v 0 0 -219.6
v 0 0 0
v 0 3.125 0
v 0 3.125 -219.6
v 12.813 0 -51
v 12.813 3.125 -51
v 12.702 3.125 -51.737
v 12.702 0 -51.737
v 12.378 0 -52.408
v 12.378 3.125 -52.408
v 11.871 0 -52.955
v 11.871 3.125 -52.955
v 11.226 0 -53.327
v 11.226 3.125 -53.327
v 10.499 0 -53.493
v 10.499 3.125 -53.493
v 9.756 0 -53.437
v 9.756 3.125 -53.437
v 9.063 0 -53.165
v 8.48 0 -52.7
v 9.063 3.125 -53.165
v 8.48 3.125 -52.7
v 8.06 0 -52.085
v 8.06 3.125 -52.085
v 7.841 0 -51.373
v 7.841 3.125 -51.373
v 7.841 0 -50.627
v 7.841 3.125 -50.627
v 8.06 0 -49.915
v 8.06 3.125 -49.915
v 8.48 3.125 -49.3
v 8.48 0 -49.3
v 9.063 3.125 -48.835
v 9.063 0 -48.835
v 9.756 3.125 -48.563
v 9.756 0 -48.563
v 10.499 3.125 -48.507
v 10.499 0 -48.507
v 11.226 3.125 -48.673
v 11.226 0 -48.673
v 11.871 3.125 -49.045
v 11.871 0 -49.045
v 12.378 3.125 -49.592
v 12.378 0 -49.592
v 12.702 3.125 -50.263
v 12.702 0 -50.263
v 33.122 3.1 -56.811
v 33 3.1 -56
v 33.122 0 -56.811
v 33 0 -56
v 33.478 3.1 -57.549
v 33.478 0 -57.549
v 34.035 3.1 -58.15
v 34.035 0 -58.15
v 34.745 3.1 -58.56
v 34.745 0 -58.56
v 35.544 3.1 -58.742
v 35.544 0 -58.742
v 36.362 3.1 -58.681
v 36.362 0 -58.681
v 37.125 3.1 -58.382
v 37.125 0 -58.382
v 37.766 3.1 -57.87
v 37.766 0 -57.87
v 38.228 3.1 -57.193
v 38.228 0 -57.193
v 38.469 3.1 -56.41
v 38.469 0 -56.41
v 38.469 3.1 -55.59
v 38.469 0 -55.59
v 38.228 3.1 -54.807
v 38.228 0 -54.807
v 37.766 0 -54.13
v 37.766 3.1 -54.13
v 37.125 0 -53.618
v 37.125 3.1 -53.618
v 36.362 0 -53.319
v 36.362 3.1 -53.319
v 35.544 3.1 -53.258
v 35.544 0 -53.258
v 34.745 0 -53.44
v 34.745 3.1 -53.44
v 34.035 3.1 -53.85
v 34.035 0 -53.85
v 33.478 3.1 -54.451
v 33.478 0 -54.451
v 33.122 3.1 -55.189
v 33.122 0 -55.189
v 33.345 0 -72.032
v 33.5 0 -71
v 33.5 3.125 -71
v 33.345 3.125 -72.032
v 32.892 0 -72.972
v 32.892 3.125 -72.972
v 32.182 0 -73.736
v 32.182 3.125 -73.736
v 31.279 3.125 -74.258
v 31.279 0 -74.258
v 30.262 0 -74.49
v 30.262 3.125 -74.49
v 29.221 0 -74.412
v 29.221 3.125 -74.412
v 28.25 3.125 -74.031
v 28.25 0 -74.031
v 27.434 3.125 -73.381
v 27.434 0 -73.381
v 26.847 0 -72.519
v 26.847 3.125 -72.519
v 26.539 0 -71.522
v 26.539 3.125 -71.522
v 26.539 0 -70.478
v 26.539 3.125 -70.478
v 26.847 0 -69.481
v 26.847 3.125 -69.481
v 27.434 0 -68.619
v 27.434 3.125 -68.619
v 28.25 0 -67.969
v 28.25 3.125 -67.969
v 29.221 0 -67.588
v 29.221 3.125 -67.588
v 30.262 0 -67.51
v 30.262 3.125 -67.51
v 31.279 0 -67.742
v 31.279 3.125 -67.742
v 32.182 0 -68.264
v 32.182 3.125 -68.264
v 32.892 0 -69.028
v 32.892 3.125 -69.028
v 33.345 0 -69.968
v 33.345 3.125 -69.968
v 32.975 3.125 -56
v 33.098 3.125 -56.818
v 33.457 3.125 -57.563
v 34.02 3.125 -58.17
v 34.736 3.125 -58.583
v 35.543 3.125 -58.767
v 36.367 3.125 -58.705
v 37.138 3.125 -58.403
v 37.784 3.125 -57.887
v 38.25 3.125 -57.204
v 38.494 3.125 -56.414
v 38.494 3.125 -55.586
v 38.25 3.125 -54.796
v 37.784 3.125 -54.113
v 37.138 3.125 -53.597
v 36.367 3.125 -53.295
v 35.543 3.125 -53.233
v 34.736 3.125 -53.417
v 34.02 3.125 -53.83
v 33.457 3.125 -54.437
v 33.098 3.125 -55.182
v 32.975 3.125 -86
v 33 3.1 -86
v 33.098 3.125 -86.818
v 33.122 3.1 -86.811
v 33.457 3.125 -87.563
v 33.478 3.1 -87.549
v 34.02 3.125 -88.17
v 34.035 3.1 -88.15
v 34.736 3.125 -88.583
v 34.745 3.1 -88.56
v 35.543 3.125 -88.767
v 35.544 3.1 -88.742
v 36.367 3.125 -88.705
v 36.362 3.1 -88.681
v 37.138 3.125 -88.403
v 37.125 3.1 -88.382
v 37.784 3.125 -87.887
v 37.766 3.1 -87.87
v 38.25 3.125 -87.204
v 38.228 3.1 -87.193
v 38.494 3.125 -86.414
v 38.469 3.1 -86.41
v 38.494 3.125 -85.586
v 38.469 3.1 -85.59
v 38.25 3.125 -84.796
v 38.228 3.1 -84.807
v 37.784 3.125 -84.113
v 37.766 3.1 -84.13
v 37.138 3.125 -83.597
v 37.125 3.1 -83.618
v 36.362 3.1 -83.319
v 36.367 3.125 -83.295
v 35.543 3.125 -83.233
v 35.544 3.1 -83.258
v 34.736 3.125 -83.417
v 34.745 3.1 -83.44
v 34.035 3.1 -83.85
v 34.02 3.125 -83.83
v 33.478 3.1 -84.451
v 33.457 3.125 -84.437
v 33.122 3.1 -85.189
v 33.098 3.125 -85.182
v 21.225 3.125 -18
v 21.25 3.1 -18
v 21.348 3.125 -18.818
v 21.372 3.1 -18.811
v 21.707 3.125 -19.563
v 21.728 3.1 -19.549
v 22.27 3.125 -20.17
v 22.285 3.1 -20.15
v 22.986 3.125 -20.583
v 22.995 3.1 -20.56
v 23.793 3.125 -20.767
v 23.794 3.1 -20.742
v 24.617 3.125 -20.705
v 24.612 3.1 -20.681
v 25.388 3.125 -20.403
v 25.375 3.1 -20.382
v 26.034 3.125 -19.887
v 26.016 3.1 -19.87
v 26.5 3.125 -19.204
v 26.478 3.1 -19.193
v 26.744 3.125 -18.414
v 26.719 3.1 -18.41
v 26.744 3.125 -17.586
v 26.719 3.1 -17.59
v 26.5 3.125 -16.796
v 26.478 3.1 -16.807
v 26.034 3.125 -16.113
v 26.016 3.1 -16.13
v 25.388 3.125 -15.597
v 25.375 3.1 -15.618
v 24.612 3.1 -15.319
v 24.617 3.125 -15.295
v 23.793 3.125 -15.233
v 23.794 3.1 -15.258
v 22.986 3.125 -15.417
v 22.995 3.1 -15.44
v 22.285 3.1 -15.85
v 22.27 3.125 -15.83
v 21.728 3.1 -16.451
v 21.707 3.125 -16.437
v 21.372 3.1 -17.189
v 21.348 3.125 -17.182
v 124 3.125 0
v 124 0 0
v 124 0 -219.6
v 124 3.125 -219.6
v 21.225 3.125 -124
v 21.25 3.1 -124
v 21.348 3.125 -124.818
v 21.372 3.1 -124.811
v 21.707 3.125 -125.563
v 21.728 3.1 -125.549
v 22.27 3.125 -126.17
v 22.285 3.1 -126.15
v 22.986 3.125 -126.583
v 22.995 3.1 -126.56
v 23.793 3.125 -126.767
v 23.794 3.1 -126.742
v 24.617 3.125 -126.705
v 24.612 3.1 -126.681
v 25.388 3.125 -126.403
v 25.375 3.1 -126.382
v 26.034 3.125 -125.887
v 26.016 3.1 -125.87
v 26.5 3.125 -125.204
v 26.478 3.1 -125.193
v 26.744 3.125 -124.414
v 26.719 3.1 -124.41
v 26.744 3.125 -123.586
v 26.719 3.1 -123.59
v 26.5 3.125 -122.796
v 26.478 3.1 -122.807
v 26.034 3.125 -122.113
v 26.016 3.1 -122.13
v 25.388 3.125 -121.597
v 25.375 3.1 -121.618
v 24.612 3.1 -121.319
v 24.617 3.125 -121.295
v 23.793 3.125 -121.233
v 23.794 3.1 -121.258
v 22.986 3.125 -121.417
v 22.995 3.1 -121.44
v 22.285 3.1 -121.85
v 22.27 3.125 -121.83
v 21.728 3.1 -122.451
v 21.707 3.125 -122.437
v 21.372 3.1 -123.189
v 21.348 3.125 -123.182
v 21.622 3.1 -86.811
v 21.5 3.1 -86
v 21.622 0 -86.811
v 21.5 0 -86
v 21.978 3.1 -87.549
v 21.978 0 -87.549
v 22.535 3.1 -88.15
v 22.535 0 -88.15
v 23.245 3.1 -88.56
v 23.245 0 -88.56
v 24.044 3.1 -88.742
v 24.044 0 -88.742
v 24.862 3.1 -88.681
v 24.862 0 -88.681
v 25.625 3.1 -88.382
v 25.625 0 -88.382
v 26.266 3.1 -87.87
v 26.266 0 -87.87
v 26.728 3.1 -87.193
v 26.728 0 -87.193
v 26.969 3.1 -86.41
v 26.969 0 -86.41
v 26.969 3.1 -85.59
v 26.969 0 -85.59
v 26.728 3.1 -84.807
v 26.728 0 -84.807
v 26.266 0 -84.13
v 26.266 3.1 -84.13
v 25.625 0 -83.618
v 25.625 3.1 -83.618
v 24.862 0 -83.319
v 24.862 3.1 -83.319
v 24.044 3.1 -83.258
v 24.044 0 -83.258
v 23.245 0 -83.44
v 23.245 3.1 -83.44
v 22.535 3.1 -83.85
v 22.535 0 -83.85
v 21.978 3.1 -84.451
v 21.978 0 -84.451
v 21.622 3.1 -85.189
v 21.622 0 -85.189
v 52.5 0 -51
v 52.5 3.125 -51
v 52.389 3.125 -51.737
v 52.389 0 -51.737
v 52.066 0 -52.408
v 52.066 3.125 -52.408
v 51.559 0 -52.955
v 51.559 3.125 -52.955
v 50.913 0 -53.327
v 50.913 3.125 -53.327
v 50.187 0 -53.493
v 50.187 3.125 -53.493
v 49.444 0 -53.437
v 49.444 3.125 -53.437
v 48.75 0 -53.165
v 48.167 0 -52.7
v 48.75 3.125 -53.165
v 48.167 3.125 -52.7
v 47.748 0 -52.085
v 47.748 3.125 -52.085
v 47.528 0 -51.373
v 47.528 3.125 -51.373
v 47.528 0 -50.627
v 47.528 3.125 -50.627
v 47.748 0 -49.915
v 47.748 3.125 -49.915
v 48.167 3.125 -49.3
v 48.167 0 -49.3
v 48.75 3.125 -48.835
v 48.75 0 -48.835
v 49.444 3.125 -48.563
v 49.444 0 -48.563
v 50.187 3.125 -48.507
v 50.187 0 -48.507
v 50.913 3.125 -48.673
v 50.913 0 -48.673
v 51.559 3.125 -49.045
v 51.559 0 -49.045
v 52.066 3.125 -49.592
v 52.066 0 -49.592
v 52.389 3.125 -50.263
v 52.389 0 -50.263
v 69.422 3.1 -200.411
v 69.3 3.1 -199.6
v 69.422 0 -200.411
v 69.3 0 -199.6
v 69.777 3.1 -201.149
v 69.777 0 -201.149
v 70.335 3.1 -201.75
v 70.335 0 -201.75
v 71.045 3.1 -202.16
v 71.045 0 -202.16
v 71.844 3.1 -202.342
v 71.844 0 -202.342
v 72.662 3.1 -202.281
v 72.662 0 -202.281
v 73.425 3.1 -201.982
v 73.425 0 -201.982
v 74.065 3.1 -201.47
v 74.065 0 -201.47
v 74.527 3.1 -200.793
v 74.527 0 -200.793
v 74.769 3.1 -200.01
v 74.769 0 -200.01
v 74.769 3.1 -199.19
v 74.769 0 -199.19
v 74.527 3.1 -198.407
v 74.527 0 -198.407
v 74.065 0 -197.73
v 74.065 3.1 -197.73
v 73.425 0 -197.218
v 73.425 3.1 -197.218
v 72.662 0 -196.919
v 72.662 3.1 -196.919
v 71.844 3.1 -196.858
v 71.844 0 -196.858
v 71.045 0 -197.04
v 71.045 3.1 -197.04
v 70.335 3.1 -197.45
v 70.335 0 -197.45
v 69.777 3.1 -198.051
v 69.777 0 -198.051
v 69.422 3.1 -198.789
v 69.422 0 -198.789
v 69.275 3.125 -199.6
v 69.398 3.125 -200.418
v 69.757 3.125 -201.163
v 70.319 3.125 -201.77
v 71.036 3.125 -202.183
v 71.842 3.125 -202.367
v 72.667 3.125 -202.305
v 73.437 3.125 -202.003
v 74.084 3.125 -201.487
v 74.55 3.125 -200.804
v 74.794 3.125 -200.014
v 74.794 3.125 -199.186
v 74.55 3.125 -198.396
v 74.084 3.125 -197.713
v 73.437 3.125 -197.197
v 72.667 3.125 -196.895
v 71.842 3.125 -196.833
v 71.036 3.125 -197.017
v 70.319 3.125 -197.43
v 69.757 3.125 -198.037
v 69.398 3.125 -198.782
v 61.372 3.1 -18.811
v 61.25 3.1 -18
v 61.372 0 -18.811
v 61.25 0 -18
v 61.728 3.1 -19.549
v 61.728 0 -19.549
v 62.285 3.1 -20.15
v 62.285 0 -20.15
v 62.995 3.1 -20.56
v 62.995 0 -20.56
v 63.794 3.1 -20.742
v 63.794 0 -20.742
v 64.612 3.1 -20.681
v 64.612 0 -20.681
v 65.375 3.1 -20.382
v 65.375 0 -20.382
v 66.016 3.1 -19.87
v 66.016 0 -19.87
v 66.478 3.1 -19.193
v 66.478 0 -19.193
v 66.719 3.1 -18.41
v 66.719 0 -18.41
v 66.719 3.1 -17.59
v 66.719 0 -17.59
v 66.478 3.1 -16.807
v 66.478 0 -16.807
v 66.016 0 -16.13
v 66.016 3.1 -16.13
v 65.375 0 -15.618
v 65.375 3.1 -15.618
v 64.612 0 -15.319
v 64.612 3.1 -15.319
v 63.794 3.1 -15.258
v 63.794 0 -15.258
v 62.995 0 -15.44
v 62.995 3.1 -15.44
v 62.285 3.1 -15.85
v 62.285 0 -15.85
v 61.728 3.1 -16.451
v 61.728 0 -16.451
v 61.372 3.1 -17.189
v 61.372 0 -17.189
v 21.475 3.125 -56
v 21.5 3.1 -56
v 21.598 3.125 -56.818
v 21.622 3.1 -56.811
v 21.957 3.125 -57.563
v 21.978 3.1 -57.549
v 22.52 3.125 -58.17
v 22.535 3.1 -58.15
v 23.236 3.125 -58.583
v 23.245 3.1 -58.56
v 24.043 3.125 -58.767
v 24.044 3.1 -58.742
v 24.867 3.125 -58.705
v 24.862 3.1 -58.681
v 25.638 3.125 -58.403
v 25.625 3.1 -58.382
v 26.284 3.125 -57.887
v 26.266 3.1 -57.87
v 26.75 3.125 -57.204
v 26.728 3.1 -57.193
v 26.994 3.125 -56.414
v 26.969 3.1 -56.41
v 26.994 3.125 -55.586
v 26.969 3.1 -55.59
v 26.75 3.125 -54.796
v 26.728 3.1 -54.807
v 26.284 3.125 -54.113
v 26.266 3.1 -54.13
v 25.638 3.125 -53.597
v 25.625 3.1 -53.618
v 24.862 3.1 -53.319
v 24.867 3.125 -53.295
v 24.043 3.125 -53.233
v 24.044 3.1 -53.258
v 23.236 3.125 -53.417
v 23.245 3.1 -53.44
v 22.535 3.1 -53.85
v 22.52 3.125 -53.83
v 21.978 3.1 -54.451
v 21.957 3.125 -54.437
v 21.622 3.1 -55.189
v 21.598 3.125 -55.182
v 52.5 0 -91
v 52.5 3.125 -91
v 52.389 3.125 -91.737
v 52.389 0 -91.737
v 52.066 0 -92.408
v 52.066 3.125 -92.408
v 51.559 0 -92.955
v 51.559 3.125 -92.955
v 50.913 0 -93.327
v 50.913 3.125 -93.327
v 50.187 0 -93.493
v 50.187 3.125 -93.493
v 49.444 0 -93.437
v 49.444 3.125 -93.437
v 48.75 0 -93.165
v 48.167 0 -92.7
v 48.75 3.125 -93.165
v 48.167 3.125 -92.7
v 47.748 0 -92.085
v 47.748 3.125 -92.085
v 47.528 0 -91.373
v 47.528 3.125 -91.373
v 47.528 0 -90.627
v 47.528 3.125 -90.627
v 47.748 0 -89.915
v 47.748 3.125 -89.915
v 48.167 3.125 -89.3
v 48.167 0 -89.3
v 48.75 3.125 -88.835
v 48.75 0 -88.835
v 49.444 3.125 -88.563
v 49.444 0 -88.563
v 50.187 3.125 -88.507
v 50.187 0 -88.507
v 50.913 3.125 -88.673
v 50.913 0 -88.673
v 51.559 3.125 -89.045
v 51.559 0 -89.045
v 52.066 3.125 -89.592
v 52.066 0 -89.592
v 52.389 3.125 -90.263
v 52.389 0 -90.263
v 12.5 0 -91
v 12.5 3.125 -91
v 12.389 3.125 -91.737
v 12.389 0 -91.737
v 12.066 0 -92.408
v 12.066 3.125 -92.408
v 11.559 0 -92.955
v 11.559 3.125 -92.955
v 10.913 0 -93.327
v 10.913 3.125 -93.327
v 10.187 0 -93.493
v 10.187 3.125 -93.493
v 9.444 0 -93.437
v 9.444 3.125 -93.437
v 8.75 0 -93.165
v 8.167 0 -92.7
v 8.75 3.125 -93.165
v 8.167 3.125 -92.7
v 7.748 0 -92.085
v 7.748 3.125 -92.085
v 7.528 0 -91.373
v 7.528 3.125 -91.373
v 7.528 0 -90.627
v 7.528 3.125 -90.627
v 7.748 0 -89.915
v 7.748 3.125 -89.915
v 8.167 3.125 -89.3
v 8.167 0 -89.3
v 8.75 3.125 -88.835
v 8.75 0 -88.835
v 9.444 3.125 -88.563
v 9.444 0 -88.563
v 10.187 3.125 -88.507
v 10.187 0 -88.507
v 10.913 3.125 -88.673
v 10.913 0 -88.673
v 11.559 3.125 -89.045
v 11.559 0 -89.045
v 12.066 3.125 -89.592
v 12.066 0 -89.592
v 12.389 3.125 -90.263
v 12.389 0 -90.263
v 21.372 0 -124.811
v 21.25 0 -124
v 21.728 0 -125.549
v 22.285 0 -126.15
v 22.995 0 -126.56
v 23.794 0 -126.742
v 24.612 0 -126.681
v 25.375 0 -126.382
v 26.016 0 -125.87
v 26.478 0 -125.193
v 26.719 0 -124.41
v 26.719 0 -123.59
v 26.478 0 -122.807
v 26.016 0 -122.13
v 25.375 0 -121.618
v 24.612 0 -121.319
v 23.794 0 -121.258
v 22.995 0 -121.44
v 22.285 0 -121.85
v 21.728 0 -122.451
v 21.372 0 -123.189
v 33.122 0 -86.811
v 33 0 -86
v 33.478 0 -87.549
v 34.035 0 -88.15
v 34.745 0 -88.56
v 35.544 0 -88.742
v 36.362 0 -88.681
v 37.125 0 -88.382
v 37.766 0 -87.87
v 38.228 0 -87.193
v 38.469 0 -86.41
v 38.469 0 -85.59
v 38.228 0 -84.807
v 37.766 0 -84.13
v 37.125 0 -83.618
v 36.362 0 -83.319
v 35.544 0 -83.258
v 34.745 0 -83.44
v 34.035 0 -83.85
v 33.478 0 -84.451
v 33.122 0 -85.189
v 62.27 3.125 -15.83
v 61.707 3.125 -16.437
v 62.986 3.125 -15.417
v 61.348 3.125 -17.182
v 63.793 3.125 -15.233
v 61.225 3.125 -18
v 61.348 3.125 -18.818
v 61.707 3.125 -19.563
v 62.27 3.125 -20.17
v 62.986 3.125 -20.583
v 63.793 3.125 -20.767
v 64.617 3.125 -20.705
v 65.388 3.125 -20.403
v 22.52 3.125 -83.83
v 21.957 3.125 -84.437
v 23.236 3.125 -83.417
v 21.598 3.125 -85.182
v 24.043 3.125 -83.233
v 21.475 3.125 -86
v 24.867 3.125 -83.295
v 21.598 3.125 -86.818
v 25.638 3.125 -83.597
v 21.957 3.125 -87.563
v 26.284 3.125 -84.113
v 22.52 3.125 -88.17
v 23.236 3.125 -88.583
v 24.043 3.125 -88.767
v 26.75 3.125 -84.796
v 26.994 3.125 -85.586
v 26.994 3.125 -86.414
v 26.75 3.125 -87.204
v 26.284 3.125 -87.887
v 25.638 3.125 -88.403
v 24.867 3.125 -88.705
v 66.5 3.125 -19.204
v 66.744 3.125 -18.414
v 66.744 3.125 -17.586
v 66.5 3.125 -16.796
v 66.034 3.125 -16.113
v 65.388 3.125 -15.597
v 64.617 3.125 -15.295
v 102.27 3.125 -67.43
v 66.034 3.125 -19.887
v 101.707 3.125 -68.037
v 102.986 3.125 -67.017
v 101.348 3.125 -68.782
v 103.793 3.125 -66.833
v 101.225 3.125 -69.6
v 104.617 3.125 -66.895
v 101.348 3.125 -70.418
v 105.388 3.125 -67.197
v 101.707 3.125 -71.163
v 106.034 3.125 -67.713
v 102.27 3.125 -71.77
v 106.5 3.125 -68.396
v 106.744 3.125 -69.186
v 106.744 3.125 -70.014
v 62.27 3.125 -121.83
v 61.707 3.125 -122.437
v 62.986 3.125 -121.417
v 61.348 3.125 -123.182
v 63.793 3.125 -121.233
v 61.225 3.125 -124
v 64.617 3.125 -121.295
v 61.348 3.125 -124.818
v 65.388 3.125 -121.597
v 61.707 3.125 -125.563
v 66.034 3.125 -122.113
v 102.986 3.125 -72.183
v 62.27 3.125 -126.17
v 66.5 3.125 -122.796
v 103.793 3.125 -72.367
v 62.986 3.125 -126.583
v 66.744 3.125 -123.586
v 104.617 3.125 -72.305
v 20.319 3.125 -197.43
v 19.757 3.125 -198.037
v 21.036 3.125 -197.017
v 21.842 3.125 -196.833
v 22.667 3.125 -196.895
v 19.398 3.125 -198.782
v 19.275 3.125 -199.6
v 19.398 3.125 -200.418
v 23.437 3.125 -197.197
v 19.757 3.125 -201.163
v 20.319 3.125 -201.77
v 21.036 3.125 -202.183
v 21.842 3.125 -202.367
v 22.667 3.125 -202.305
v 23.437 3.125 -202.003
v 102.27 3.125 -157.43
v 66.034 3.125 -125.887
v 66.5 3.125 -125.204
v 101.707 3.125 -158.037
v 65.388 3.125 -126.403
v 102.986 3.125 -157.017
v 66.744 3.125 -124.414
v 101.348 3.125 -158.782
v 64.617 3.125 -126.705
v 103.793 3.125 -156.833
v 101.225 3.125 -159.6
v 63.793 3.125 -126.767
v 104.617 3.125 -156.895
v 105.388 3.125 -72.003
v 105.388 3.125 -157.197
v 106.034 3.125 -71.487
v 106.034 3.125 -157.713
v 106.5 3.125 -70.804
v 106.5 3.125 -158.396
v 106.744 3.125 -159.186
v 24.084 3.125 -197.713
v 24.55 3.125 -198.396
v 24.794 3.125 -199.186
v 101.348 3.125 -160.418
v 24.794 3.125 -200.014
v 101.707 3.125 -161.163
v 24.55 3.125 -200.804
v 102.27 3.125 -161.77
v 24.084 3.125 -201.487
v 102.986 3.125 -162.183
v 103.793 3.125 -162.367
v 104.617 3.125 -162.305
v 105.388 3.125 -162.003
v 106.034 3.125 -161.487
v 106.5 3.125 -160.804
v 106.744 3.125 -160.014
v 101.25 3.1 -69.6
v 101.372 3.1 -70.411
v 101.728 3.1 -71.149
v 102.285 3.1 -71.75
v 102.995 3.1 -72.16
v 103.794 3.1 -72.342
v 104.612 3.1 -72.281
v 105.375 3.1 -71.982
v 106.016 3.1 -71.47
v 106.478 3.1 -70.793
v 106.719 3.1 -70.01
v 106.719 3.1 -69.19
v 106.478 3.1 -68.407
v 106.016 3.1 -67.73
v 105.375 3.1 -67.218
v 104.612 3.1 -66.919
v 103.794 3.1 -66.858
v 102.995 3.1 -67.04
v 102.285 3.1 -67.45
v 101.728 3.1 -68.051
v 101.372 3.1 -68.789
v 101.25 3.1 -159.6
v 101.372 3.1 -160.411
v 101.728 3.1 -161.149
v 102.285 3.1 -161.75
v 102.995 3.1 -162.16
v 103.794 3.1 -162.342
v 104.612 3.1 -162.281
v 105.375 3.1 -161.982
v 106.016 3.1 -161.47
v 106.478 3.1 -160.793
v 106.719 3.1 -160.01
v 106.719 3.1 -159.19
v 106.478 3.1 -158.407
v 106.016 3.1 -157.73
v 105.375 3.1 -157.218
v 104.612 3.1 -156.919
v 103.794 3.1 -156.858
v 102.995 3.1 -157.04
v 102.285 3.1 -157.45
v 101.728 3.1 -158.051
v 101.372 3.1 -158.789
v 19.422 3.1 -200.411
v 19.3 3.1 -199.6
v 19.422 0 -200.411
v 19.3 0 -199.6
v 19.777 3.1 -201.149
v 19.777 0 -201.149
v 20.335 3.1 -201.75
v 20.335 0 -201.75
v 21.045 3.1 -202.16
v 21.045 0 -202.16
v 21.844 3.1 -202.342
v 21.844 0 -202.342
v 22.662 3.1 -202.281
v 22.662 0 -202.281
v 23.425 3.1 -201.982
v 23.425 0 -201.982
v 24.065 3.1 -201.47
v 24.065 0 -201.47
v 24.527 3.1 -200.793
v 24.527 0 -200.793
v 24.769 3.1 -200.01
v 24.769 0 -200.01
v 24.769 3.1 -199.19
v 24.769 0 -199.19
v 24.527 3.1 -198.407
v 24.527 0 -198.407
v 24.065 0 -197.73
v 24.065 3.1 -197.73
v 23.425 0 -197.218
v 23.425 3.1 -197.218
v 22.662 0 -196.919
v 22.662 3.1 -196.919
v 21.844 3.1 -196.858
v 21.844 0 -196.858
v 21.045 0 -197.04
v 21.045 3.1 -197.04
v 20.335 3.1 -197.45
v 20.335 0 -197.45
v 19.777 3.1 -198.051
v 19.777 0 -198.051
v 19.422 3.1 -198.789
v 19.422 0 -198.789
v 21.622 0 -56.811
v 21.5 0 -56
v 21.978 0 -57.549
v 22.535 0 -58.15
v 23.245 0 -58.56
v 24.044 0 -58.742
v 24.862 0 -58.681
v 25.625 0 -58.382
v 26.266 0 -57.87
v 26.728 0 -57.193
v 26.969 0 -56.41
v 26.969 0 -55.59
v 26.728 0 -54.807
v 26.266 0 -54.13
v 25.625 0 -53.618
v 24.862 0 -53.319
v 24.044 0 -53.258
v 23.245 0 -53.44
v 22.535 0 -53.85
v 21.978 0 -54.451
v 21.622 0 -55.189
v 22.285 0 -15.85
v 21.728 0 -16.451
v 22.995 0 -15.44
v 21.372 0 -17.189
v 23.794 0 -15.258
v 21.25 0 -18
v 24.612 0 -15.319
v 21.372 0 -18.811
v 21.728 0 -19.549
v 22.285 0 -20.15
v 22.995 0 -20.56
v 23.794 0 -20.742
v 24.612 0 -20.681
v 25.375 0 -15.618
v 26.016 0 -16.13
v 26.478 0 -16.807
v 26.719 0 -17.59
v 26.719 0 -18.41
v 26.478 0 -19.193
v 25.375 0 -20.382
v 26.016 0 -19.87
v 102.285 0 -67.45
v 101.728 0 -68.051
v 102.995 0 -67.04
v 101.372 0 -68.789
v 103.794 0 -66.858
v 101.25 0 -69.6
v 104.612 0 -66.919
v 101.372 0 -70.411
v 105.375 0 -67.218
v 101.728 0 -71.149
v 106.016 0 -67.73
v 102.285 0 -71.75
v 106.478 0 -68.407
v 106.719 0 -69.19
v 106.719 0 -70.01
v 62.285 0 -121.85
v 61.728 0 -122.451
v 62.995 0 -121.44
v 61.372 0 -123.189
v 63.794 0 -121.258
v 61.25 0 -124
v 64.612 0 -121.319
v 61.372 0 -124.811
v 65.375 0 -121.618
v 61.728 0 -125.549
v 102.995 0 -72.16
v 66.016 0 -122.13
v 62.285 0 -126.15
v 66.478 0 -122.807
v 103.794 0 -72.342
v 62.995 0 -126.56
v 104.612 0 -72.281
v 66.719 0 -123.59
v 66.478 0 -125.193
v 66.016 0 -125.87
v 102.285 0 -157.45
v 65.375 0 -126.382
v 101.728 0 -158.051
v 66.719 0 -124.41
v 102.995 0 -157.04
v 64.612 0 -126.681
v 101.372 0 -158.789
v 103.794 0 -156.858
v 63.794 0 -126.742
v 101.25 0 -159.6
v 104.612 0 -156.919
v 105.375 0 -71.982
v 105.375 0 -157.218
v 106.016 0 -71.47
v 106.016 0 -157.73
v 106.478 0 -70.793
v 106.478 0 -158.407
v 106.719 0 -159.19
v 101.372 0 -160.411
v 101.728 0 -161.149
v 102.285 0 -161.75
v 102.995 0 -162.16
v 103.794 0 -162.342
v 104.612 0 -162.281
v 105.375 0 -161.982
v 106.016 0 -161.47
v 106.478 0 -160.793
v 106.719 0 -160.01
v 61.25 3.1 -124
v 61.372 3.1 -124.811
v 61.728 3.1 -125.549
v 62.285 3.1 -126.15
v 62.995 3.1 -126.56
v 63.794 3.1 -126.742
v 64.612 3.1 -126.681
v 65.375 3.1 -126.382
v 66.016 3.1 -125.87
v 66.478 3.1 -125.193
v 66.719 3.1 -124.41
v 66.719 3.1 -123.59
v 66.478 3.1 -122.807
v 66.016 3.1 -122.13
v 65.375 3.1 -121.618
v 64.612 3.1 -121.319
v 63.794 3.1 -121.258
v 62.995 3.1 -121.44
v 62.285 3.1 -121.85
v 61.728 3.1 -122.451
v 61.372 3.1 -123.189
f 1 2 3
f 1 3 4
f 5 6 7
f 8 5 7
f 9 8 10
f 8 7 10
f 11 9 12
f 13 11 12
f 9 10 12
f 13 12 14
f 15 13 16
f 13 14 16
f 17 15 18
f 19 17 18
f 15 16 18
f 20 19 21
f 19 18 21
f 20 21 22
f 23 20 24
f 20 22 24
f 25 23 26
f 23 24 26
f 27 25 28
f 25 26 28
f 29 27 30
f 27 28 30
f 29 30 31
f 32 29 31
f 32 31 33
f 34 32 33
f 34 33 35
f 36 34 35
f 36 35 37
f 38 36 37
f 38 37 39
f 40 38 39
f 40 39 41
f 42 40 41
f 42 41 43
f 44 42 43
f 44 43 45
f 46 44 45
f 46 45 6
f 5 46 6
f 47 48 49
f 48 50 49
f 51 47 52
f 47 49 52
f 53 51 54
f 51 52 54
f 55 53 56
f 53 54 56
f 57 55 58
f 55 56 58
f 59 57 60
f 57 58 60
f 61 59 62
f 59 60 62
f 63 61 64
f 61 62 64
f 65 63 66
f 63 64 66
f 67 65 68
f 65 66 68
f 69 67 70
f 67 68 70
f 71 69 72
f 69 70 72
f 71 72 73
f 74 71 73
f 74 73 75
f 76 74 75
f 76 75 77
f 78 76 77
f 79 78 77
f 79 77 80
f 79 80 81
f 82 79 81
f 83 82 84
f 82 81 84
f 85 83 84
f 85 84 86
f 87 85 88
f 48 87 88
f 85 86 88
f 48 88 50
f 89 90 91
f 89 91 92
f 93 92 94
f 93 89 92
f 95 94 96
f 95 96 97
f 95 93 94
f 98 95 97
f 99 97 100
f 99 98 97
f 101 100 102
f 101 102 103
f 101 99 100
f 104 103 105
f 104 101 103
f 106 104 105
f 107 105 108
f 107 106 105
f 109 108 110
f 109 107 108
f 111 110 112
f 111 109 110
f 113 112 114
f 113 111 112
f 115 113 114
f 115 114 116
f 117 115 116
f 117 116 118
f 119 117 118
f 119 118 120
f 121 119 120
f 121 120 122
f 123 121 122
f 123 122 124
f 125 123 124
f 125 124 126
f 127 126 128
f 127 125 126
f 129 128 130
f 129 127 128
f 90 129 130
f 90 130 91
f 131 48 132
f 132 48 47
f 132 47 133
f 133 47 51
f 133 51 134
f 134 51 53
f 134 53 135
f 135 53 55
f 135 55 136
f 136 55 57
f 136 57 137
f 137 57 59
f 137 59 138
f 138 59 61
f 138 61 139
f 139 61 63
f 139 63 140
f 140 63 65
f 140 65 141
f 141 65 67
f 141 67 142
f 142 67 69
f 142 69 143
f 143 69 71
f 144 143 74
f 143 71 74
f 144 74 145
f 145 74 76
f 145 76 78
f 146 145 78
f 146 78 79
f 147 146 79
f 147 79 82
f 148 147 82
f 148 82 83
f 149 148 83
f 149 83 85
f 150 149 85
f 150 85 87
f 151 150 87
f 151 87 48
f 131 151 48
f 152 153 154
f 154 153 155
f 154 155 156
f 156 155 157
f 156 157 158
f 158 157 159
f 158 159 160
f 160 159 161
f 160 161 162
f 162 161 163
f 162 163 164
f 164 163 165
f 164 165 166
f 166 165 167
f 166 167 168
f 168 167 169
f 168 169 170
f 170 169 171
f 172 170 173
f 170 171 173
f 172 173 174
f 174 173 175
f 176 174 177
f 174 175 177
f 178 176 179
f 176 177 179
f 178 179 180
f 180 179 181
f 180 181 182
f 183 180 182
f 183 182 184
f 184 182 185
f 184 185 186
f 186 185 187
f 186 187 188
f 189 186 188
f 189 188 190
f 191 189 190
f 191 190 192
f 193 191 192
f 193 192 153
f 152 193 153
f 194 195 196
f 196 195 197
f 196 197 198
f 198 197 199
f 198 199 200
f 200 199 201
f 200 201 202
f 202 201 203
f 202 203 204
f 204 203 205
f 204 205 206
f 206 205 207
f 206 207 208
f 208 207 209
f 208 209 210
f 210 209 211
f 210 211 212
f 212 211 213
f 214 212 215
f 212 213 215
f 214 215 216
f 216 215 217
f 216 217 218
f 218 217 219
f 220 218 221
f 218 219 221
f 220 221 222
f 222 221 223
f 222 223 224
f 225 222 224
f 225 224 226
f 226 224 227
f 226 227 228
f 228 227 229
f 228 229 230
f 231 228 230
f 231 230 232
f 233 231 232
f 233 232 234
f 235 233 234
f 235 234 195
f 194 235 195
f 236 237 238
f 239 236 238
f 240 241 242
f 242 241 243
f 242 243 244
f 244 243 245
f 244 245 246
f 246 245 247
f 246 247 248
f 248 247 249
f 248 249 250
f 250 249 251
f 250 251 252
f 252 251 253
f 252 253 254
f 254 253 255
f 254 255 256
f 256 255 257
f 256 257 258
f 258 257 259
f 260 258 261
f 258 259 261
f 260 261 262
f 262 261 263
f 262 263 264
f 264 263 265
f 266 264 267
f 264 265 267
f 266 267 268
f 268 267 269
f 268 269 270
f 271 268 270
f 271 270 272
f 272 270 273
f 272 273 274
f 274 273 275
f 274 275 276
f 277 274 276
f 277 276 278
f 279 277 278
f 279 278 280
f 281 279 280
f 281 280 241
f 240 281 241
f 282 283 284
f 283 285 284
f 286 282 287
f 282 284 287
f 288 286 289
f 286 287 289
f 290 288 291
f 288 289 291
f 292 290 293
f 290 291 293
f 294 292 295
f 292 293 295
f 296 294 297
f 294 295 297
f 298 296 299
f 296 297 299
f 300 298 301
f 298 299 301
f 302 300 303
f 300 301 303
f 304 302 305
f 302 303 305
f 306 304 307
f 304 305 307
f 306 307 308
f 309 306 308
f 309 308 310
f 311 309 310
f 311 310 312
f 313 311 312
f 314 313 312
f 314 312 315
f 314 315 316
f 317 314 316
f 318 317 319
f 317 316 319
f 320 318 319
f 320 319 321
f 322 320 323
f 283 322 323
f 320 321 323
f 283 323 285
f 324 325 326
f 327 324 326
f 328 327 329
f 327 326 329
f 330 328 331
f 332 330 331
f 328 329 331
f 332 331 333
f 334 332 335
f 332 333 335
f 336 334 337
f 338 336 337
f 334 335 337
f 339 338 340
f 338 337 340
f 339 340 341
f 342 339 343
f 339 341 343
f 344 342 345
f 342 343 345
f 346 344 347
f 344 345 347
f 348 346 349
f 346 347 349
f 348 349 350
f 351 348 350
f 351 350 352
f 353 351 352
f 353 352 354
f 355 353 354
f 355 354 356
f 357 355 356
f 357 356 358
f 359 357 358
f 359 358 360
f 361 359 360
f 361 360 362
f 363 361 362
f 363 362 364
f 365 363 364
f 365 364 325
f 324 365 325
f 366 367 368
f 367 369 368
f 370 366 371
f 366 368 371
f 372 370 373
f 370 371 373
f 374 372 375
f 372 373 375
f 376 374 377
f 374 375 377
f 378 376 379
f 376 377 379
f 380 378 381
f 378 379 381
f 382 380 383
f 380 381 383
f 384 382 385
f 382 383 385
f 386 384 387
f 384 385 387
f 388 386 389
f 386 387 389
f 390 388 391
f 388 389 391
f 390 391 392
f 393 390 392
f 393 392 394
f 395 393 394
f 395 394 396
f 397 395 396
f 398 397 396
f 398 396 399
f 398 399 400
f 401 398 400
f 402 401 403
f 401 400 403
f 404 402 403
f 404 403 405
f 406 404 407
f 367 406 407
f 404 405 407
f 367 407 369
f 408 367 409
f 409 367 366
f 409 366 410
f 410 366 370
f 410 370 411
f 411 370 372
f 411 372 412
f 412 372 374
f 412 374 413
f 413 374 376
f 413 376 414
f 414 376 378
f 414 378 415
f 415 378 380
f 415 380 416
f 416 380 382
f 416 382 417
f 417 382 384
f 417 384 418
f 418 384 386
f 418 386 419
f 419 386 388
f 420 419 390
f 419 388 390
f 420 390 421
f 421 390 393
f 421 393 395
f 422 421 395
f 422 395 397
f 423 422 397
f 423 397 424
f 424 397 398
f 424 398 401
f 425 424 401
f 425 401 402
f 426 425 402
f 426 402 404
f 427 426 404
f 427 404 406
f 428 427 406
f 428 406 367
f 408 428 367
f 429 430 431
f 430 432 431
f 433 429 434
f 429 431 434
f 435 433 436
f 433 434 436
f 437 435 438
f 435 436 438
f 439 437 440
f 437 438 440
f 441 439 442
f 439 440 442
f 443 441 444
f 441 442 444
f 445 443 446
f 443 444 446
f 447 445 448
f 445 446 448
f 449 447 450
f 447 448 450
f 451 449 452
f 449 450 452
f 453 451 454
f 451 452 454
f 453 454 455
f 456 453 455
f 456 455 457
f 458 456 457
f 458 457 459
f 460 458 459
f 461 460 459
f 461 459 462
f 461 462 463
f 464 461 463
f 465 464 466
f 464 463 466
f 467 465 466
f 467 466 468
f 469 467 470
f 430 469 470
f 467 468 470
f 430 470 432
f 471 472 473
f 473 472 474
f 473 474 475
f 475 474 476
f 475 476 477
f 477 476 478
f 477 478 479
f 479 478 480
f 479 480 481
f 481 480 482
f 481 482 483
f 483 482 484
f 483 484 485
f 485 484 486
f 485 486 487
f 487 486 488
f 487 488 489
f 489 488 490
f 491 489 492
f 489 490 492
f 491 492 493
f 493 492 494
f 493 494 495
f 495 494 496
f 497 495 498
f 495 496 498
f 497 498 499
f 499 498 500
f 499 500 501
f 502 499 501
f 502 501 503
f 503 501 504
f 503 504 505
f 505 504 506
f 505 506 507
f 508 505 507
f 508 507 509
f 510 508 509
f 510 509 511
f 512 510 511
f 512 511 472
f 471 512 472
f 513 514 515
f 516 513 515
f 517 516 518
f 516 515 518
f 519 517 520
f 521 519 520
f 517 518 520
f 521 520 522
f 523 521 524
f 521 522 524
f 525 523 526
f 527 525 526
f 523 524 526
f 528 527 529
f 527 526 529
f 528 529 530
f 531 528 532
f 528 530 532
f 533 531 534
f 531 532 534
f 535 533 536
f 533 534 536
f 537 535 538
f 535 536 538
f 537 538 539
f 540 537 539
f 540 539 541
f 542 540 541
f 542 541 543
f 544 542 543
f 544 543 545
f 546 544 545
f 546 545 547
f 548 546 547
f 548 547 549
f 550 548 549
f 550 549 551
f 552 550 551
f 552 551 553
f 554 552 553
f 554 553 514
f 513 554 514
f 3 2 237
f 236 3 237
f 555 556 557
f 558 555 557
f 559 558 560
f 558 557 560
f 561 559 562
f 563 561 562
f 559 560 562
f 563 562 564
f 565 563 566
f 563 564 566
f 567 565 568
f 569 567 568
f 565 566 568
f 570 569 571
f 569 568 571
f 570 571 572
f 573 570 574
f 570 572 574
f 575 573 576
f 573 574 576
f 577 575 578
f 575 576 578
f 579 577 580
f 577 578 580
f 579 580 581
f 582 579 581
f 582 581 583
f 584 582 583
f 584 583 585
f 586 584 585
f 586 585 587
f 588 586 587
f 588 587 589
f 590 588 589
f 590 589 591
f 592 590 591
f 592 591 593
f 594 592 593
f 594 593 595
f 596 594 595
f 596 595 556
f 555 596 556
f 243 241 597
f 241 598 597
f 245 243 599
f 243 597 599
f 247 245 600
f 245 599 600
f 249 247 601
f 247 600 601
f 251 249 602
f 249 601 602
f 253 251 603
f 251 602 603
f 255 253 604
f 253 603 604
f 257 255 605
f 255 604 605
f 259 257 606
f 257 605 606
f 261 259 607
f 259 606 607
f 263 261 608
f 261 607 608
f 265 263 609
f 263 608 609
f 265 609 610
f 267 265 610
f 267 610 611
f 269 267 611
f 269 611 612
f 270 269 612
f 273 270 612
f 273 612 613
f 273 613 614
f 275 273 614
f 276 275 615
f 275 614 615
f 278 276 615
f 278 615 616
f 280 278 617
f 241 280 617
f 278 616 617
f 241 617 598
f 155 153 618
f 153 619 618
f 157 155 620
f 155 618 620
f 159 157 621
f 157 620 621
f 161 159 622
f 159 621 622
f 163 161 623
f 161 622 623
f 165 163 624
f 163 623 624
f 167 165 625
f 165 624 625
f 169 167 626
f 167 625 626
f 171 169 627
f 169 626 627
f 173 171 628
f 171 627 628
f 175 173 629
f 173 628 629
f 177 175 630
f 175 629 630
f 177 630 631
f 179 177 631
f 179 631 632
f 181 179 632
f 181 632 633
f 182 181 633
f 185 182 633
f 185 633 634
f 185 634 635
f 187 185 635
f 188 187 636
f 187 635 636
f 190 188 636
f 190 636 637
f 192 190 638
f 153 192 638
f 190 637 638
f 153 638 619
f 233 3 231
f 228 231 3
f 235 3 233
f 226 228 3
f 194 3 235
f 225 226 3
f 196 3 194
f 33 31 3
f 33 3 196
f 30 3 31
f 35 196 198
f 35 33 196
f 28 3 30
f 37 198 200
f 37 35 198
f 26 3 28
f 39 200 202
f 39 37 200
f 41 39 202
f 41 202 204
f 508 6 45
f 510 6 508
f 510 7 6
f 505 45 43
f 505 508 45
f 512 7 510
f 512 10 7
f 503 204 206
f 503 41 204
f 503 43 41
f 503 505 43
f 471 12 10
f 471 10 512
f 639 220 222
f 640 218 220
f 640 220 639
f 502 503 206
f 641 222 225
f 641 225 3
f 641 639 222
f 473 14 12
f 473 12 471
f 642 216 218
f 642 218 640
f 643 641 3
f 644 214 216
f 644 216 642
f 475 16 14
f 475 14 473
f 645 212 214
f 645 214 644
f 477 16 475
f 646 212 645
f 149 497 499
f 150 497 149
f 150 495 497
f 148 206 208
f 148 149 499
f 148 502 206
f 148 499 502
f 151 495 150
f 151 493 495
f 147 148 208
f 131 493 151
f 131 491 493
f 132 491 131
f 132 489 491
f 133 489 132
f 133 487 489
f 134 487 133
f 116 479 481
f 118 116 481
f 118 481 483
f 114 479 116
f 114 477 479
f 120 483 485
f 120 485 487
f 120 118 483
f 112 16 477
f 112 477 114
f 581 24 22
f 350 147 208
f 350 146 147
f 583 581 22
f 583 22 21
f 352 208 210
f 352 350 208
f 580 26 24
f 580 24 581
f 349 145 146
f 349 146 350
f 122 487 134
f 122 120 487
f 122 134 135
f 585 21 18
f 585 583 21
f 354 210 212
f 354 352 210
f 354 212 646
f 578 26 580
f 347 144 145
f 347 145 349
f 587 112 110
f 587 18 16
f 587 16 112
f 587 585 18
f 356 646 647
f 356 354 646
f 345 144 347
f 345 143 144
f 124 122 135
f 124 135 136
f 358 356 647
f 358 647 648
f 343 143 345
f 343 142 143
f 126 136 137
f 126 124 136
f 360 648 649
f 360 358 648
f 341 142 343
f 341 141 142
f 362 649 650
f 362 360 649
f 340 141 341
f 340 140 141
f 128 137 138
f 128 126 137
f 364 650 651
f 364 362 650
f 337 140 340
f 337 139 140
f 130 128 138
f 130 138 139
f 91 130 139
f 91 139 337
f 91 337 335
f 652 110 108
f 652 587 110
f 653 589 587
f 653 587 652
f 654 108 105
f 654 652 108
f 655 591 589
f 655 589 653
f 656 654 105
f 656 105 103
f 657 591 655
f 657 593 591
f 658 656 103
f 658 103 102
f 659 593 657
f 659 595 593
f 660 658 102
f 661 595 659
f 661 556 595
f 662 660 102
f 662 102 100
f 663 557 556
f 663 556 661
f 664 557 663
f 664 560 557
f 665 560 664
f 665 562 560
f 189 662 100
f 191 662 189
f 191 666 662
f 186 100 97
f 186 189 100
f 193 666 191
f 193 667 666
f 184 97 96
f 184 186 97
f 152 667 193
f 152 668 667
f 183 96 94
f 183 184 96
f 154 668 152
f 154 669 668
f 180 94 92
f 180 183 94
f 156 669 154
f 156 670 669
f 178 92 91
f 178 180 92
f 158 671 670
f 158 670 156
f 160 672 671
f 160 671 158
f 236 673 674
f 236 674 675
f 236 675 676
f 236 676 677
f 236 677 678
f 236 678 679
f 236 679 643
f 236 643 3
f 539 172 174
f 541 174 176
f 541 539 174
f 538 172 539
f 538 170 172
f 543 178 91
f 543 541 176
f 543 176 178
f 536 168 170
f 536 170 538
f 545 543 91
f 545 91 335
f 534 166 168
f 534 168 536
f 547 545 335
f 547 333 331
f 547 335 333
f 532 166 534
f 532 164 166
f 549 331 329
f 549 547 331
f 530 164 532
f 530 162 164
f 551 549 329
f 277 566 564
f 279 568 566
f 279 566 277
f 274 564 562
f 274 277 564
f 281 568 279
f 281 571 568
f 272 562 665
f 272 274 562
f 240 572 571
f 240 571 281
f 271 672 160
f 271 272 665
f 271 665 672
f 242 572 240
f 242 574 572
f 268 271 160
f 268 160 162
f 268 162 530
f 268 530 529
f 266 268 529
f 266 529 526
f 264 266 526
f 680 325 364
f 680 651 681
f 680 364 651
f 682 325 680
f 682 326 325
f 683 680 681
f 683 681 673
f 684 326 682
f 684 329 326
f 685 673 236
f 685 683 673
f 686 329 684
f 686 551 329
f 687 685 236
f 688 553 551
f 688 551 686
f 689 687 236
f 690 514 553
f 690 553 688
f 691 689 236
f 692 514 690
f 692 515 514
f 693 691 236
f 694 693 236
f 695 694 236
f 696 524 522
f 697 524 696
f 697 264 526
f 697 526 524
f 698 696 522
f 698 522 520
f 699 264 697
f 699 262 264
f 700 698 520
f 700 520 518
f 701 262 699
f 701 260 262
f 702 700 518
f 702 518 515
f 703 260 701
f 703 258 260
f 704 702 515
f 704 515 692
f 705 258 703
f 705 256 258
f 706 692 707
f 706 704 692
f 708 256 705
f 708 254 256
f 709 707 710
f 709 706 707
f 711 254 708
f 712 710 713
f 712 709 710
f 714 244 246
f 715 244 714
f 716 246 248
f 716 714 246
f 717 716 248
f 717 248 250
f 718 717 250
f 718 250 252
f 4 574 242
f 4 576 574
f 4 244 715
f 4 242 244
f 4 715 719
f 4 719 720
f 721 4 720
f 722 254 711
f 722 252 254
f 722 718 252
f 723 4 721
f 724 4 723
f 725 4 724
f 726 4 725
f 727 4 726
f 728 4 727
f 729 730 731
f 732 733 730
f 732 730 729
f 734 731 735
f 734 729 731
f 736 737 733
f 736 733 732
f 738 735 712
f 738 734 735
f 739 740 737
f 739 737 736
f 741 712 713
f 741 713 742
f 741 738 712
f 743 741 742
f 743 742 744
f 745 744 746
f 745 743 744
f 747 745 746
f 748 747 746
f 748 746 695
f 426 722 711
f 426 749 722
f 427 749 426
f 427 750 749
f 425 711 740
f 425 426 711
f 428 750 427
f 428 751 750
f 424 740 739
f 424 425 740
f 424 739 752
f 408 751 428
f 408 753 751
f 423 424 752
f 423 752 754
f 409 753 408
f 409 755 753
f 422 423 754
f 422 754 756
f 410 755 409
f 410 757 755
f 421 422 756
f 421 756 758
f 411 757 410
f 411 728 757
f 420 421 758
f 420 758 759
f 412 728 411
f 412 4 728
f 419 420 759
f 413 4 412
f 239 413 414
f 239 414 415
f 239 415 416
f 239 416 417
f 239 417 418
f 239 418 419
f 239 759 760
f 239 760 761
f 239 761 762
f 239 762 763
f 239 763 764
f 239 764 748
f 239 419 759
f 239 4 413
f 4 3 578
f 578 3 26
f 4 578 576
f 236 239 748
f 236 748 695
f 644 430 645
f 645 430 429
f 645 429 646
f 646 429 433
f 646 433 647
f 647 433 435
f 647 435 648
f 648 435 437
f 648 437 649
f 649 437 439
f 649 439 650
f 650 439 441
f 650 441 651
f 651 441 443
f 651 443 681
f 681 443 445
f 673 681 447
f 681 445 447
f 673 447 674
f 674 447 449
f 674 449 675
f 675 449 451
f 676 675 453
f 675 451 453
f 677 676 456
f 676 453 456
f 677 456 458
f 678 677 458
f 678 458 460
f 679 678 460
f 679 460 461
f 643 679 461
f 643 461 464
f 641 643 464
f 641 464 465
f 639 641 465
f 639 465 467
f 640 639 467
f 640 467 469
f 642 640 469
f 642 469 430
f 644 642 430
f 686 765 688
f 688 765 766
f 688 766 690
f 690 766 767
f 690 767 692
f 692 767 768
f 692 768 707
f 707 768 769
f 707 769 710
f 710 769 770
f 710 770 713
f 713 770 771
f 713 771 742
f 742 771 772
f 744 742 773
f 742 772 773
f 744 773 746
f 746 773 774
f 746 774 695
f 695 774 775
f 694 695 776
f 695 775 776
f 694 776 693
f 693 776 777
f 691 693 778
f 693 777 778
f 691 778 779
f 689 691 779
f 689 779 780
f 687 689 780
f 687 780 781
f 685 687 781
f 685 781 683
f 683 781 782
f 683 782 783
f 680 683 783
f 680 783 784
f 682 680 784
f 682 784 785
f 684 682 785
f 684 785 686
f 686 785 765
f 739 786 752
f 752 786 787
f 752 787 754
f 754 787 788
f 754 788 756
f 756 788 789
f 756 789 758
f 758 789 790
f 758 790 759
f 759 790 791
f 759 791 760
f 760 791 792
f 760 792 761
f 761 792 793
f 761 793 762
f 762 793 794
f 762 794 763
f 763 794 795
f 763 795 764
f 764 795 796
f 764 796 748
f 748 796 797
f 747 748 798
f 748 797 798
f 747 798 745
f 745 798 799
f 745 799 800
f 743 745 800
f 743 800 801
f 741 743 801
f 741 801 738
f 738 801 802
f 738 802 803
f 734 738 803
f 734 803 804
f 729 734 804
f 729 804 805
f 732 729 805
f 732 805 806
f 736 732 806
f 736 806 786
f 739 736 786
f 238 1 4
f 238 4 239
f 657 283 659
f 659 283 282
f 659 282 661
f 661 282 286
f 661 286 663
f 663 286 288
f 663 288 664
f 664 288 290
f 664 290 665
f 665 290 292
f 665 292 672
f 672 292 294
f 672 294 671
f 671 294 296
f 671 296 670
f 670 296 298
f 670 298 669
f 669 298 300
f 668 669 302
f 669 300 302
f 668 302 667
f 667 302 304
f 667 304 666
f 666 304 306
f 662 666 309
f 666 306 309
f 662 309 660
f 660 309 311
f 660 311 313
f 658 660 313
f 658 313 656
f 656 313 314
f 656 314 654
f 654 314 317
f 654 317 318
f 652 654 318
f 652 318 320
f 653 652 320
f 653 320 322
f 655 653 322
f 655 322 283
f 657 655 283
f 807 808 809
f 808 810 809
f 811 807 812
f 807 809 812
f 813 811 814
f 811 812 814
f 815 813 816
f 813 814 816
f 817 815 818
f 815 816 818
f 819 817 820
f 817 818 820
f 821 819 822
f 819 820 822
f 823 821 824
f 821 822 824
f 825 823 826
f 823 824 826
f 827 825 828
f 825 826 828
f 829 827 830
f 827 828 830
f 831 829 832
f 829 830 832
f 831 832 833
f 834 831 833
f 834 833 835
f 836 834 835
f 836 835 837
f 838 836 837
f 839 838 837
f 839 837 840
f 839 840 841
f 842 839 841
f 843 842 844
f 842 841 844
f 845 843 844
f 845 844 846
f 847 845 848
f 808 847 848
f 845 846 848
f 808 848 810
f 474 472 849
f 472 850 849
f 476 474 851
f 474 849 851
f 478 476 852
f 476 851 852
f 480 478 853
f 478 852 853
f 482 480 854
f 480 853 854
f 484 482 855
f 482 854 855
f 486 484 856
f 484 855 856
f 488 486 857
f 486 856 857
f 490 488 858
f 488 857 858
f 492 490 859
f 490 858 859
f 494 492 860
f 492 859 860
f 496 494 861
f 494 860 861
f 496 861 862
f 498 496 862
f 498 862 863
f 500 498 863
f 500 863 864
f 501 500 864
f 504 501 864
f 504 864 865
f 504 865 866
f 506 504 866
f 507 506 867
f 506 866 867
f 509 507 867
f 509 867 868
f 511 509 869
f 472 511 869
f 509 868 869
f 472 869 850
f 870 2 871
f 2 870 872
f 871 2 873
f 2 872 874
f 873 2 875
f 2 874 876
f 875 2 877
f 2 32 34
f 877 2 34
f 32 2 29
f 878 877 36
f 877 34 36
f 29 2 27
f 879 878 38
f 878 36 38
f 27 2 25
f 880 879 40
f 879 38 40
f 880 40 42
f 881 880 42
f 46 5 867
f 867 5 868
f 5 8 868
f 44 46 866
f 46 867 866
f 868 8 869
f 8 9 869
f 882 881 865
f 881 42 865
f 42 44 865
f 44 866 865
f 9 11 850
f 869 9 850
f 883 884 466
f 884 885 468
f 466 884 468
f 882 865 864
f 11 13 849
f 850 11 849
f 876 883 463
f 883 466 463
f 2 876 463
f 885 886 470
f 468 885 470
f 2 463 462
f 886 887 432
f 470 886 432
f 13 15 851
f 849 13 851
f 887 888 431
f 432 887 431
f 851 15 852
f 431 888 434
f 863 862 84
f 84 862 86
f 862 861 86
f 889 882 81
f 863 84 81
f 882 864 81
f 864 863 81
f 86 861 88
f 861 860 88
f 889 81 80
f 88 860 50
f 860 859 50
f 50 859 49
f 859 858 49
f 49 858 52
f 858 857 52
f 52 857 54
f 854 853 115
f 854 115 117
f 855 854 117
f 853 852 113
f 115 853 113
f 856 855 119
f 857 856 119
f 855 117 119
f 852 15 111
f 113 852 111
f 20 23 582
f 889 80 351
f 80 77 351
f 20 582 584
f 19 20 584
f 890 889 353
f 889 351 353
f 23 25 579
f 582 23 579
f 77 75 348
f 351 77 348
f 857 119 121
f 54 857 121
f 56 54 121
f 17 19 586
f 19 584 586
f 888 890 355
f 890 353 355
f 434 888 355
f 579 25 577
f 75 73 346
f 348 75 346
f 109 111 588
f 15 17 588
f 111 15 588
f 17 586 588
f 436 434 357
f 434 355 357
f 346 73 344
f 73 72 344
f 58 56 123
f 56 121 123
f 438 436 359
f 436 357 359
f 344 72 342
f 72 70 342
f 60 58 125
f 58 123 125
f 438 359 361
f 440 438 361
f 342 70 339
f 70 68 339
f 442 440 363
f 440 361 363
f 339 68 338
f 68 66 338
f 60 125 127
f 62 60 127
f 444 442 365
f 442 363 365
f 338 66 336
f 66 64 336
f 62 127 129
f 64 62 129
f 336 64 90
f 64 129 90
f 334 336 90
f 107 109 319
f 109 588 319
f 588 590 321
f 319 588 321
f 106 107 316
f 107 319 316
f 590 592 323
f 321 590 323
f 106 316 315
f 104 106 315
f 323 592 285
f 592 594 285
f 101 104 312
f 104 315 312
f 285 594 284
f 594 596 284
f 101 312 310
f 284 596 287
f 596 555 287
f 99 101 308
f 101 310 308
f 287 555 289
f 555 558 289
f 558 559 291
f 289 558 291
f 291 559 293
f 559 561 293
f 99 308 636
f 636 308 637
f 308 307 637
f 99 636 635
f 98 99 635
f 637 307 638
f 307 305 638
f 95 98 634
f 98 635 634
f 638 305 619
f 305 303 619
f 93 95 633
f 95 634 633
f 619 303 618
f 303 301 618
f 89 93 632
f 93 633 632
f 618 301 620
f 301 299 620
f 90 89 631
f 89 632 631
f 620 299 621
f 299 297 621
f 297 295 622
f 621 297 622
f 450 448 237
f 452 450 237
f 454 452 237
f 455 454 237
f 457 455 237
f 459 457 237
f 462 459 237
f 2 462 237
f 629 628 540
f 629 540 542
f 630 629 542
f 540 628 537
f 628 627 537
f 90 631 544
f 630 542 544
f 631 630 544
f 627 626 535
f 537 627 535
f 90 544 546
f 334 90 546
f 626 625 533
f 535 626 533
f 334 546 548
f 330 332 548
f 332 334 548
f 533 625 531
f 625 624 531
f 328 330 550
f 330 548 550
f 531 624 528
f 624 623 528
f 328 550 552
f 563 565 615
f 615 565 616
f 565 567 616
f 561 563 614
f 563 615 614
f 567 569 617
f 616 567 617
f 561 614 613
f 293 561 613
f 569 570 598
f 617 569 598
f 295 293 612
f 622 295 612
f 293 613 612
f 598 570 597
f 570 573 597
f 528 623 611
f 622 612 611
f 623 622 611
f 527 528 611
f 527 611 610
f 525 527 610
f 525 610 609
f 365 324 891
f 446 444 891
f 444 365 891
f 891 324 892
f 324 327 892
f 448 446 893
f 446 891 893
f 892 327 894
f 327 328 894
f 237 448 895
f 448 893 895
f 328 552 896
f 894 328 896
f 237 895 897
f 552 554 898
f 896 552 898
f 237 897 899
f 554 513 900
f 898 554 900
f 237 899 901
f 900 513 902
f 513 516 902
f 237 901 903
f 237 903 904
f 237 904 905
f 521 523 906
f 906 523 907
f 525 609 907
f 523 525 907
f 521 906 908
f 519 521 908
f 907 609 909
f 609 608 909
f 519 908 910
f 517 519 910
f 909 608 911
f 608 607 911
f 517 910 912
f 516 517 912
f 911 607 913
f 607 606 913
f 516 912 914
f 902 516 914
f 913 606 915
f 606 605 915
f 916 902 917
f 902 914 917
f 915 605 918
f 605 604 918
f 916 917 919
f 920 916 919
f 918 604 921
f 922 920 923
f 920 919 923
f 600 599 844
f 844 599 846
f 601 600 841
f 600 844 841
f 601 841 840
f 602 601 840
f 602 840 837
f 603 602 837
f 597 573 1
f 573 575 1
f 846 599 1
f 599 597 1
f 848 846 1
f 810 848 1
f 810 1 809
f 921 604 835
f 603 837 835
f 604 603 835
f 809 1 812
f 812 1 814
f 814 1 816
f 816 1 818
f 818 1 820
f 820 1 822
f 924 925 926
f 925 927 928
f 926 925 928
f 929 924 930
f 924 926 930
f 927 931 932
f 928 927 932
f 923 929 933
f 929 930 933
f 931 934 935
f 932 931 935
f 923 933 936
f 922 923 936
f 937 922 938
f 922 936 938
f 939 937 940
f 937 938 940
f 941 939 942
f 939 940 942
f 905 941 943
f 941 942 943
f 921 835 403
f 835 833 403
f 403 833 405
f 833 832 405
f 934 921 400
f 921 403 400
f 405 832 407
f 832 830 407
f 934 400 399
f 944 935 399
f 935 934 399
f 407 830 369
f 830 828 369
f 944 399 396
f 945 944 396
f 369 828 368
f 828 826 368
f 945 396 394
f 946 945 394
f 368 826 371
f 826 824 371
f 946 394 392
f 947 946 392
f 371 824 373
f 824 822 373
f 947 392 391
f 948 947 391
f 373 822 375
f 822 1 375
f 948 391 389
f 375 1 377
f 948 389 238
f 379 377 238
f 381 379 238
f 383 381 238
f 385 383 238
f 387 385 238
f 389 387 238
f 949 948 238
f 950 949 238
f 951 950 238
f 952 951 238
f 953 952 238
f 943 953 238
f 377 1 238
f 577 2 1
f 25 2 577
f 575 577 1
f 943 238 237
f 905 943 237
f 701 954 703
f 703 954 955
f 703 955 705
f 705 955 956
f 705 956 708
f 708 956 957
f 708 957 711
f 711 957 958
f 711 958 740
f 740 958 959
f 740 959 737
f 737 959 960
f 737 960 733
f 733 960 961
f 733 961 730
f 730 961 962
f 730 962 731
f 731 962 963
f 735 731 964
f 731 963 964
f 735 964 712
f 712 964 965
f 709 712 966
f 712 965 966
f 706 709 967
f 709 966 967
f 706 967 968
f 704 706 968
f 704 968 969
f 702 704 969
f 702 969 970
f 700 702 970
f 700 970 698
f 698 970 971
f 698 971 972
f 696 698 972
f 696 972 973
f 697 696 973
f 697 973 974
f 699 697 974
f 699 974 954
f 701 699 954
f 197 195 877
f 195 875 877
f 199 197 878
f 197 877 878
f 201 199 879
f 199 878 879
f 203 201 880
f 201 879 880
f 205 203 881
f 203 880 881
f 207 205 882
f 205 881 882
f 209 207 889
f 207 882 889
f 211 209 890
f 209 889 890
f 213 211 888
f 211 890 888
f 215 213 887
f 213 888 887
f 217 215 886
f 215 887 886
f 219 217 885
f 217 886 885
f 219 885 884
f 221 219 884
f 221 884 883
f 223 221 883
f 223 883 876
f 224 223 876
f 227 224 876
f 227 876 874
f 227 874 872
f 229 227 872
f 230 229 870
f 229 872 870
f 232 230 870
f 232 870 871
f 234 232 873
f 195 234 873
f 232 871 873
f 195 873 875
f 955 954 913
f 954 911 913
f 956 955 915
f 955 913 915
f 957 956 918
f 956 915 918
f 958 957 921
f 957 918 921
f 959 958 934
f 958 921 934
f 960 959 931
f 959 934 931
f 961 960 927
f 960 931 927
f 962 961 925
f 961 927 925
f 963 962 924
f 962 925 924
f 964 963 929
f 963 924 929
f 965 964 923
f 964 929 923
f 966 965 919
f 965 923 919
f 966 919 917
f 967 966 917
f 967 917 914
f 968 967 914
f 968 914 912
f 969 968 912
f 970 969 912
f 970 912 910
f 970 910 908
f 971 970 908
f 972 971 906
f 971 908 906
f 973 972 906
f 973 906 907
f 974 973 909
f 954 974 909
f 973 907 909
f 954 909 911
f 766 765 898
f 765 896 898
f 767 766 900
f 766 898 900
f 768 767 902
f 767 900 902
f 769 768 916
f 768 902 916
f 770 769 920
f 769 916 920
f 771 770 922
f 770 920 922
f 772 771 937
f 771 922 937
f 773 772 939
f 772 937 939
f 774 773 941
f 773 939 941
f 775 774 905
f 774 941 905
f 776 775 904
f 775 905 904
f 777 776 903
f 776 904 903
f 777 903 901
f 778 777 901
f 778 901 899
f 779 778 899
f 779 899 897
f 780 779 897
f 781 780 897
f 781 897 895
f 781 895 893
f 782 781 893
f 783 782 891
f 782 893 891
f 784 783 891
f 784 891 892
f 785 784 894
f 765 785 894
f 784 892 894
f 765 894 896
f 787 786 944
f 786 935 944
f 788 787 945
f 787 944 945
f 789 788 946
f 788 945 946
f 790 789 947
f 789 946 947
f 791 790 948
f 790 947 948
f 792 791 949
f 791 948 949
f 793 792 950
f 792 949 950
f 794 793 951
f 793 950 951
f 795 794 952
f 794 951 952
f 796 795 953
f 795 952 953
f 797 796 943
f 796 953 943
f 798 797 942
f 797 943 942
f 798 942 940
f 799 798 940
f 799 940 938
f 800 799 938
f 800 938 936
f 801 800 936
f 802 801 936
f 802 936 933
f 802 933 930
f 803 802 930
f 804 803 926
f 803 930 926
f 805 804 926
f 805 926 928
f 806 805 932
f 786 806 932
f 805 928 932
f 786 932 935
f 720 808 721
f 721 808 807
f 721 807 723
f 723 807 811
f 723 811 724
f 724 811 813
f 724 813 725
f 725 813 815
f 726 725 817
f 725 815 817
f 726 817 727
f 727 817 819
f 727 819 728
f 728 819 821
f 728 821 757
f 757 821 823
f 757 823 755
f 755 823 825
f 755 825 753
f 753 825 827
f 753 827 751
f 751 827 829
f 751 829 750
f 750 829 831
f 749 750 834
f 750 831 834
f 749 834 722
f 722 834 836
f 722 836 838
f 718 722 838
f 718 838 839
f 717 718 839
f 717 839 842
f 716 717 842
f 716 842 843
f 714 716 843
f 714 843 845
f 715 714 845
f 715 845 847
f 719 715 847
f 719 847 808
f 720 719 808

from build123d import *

# Parameters (mm, degrees)
SKETCH1_W                      = 124
SKETCH1_H                      = 219.6
SKETCH1_R                      = 3.5
BOSS_EXTRUDE1_DEPTH            = 3.125
SKETCH2_R                      = 2.5
CUT_EXTRUDE1_DEPTH             = 10
M5_CLEARANCE_HOLE1_D           = 5.5
M5_CLEARANCE_HOLE1_DEPTH       = 10.1
M5_CLEARANCE_HOLE1_CSINK_D     = 5.55
M5_CLEARANCE_HOLE1_CSINK_ANGLE = 90
M5_CLEARANCE_HOLE1_TIP         = 1.652366702
M5_CLEARANCE_HOLE2_D           = 5.5
M5_CLEARANCE_HOLE2_DEPTH       = 10.1
M5_CLEARANCE_HOLE2_CSINK_D     = 5.55
M5_CLEARANCE_HOLE2_CSINK_ANGLE = 90
M5_CLEARANCE_HOLE2_TIP         = 1.652366702
M5_CLEARANCE_HOLE3_D           = 5.5
M5_CLEARANCE_HOLE3_CSINK_D     = 5.55
M5_CLEARANCE_HOLE3_CSINK_ANGLE = 90


with BuildPart() as part:
    # Sketch1 → Boss-Extrude1 (new body)
    with BuildSketch(Plane(origin=(0, 0, 0), x_dir=(1, 0, 0), z_dir=(0, 1, 0))):
        with Locations((62, 109.8)):
            Rectangle(SKETCH1_W, SKETCH1_H)
        with Locations((30, 71)):
            Circle(SKETCH1_R, mode=Mode.SUBTRACT)
    extrude(amount=BOSS_EXTRUDE1_DEPTH)

    # Sketch2 → Cut-Extrude1 (cut)
    with BuildSketch(Plane(origin=(0, 3.125, 0), x_dir=(1, 0, 0), z_dir=(0, 1, 0))):
        with Locations((10.312672757, 51)):
            Circle(SKETCH2_R)
        with Locations((50, 51)):
            Circle(SKETCH2_R)
        with Locations((50, 91)):
            Circle(SKETCH2_R)
        with Locations((10, 91)):
            Circle(SKETCH2_R)
    extrude(amount=-CUT_EXTRUDE1_DEPTH, mode=Mode.SUBTRACT)

    # M5 Clearance Hole1
    with Locations(Plane(origin=(0, 3.125, 0), x_dir=(1, 0, 0), z_dir=(0, 1, 0))):
        with Locations((24.25, 86), (35.75, 86), (35.75, 56), (24.25, 56)):
            CounterSinkHole(M5_CLEARANCE_HOLE1_D / 2, M5_CLEARANCE_HOLE1_CSINK_D / 2, depth=M5_CLEARANCE_HOLE1_DEPTH, counter_sink_angle=M5_CLEARANCE_HOLE1_CSINK_ANGLE)
            with Locations((0, 0, -(M5_CLEARANCE_HOLE1_DEPTH + M5_CLEARANCE_HOLE1_TIP / 2))):  # 118° drill point
                Cone(0, M5_CLEARANCE_HOLE1_D / 2, M5_CLEARANCE_HOLE1_TIP, mode=Mode.SUBTRACT)

    # M5 Clearance Hole2
    with Locations(Plane(origin=(0, 3.125, 0), x_dir=(1, 0, 0), z_dir=(0, 1, 0))):
        with Locations((22.049589497, 199.6), (72.049589497, 199.6), (104, 159.6), (104, 69.6)):
            CounterSinkHole(M5_CLEARANCE_HOLE2_D / 2, M5_CLEARANCE_HOLE2_CSINK_D / 2, depth=M5_CLEARANCE_HOLE2_DEPTH, counter_sink_angle=M5_CLEARANCE_HOLE2_CSINK_ANGLE)
            with Locations((0, 0, -(M5_CLEARANCE_HOLE2_DEPTH + M5_CLEARANCE_HOLE2_TIP / 2))):  # 118° drill point
                Cone(0, M5_CLEARANCE_HOLE2_D / 2, M5_CLEARANCE_HOLE2_TIP, mode=Mode.SUBTRACT)

    # M5 Clearance Hole3 (through all)
    with Locations(Plane(origin=(0, 3.125, 0), x_dir=(1, 0, 0), z_dir=(0, 1, 0))):
        with Locations((24, 124), (64, 124), (24, 18), (64, 18)):
            CounterSinkHole(M5_CLEARANCE_HOLE3_D / 2, M5_CLEARANCE_HOLE3_CSINK_D / 2, counter_sink_angle=M5_CLEARANCE_HOLE3_CSINK_ANGLE)


solid = part.part
